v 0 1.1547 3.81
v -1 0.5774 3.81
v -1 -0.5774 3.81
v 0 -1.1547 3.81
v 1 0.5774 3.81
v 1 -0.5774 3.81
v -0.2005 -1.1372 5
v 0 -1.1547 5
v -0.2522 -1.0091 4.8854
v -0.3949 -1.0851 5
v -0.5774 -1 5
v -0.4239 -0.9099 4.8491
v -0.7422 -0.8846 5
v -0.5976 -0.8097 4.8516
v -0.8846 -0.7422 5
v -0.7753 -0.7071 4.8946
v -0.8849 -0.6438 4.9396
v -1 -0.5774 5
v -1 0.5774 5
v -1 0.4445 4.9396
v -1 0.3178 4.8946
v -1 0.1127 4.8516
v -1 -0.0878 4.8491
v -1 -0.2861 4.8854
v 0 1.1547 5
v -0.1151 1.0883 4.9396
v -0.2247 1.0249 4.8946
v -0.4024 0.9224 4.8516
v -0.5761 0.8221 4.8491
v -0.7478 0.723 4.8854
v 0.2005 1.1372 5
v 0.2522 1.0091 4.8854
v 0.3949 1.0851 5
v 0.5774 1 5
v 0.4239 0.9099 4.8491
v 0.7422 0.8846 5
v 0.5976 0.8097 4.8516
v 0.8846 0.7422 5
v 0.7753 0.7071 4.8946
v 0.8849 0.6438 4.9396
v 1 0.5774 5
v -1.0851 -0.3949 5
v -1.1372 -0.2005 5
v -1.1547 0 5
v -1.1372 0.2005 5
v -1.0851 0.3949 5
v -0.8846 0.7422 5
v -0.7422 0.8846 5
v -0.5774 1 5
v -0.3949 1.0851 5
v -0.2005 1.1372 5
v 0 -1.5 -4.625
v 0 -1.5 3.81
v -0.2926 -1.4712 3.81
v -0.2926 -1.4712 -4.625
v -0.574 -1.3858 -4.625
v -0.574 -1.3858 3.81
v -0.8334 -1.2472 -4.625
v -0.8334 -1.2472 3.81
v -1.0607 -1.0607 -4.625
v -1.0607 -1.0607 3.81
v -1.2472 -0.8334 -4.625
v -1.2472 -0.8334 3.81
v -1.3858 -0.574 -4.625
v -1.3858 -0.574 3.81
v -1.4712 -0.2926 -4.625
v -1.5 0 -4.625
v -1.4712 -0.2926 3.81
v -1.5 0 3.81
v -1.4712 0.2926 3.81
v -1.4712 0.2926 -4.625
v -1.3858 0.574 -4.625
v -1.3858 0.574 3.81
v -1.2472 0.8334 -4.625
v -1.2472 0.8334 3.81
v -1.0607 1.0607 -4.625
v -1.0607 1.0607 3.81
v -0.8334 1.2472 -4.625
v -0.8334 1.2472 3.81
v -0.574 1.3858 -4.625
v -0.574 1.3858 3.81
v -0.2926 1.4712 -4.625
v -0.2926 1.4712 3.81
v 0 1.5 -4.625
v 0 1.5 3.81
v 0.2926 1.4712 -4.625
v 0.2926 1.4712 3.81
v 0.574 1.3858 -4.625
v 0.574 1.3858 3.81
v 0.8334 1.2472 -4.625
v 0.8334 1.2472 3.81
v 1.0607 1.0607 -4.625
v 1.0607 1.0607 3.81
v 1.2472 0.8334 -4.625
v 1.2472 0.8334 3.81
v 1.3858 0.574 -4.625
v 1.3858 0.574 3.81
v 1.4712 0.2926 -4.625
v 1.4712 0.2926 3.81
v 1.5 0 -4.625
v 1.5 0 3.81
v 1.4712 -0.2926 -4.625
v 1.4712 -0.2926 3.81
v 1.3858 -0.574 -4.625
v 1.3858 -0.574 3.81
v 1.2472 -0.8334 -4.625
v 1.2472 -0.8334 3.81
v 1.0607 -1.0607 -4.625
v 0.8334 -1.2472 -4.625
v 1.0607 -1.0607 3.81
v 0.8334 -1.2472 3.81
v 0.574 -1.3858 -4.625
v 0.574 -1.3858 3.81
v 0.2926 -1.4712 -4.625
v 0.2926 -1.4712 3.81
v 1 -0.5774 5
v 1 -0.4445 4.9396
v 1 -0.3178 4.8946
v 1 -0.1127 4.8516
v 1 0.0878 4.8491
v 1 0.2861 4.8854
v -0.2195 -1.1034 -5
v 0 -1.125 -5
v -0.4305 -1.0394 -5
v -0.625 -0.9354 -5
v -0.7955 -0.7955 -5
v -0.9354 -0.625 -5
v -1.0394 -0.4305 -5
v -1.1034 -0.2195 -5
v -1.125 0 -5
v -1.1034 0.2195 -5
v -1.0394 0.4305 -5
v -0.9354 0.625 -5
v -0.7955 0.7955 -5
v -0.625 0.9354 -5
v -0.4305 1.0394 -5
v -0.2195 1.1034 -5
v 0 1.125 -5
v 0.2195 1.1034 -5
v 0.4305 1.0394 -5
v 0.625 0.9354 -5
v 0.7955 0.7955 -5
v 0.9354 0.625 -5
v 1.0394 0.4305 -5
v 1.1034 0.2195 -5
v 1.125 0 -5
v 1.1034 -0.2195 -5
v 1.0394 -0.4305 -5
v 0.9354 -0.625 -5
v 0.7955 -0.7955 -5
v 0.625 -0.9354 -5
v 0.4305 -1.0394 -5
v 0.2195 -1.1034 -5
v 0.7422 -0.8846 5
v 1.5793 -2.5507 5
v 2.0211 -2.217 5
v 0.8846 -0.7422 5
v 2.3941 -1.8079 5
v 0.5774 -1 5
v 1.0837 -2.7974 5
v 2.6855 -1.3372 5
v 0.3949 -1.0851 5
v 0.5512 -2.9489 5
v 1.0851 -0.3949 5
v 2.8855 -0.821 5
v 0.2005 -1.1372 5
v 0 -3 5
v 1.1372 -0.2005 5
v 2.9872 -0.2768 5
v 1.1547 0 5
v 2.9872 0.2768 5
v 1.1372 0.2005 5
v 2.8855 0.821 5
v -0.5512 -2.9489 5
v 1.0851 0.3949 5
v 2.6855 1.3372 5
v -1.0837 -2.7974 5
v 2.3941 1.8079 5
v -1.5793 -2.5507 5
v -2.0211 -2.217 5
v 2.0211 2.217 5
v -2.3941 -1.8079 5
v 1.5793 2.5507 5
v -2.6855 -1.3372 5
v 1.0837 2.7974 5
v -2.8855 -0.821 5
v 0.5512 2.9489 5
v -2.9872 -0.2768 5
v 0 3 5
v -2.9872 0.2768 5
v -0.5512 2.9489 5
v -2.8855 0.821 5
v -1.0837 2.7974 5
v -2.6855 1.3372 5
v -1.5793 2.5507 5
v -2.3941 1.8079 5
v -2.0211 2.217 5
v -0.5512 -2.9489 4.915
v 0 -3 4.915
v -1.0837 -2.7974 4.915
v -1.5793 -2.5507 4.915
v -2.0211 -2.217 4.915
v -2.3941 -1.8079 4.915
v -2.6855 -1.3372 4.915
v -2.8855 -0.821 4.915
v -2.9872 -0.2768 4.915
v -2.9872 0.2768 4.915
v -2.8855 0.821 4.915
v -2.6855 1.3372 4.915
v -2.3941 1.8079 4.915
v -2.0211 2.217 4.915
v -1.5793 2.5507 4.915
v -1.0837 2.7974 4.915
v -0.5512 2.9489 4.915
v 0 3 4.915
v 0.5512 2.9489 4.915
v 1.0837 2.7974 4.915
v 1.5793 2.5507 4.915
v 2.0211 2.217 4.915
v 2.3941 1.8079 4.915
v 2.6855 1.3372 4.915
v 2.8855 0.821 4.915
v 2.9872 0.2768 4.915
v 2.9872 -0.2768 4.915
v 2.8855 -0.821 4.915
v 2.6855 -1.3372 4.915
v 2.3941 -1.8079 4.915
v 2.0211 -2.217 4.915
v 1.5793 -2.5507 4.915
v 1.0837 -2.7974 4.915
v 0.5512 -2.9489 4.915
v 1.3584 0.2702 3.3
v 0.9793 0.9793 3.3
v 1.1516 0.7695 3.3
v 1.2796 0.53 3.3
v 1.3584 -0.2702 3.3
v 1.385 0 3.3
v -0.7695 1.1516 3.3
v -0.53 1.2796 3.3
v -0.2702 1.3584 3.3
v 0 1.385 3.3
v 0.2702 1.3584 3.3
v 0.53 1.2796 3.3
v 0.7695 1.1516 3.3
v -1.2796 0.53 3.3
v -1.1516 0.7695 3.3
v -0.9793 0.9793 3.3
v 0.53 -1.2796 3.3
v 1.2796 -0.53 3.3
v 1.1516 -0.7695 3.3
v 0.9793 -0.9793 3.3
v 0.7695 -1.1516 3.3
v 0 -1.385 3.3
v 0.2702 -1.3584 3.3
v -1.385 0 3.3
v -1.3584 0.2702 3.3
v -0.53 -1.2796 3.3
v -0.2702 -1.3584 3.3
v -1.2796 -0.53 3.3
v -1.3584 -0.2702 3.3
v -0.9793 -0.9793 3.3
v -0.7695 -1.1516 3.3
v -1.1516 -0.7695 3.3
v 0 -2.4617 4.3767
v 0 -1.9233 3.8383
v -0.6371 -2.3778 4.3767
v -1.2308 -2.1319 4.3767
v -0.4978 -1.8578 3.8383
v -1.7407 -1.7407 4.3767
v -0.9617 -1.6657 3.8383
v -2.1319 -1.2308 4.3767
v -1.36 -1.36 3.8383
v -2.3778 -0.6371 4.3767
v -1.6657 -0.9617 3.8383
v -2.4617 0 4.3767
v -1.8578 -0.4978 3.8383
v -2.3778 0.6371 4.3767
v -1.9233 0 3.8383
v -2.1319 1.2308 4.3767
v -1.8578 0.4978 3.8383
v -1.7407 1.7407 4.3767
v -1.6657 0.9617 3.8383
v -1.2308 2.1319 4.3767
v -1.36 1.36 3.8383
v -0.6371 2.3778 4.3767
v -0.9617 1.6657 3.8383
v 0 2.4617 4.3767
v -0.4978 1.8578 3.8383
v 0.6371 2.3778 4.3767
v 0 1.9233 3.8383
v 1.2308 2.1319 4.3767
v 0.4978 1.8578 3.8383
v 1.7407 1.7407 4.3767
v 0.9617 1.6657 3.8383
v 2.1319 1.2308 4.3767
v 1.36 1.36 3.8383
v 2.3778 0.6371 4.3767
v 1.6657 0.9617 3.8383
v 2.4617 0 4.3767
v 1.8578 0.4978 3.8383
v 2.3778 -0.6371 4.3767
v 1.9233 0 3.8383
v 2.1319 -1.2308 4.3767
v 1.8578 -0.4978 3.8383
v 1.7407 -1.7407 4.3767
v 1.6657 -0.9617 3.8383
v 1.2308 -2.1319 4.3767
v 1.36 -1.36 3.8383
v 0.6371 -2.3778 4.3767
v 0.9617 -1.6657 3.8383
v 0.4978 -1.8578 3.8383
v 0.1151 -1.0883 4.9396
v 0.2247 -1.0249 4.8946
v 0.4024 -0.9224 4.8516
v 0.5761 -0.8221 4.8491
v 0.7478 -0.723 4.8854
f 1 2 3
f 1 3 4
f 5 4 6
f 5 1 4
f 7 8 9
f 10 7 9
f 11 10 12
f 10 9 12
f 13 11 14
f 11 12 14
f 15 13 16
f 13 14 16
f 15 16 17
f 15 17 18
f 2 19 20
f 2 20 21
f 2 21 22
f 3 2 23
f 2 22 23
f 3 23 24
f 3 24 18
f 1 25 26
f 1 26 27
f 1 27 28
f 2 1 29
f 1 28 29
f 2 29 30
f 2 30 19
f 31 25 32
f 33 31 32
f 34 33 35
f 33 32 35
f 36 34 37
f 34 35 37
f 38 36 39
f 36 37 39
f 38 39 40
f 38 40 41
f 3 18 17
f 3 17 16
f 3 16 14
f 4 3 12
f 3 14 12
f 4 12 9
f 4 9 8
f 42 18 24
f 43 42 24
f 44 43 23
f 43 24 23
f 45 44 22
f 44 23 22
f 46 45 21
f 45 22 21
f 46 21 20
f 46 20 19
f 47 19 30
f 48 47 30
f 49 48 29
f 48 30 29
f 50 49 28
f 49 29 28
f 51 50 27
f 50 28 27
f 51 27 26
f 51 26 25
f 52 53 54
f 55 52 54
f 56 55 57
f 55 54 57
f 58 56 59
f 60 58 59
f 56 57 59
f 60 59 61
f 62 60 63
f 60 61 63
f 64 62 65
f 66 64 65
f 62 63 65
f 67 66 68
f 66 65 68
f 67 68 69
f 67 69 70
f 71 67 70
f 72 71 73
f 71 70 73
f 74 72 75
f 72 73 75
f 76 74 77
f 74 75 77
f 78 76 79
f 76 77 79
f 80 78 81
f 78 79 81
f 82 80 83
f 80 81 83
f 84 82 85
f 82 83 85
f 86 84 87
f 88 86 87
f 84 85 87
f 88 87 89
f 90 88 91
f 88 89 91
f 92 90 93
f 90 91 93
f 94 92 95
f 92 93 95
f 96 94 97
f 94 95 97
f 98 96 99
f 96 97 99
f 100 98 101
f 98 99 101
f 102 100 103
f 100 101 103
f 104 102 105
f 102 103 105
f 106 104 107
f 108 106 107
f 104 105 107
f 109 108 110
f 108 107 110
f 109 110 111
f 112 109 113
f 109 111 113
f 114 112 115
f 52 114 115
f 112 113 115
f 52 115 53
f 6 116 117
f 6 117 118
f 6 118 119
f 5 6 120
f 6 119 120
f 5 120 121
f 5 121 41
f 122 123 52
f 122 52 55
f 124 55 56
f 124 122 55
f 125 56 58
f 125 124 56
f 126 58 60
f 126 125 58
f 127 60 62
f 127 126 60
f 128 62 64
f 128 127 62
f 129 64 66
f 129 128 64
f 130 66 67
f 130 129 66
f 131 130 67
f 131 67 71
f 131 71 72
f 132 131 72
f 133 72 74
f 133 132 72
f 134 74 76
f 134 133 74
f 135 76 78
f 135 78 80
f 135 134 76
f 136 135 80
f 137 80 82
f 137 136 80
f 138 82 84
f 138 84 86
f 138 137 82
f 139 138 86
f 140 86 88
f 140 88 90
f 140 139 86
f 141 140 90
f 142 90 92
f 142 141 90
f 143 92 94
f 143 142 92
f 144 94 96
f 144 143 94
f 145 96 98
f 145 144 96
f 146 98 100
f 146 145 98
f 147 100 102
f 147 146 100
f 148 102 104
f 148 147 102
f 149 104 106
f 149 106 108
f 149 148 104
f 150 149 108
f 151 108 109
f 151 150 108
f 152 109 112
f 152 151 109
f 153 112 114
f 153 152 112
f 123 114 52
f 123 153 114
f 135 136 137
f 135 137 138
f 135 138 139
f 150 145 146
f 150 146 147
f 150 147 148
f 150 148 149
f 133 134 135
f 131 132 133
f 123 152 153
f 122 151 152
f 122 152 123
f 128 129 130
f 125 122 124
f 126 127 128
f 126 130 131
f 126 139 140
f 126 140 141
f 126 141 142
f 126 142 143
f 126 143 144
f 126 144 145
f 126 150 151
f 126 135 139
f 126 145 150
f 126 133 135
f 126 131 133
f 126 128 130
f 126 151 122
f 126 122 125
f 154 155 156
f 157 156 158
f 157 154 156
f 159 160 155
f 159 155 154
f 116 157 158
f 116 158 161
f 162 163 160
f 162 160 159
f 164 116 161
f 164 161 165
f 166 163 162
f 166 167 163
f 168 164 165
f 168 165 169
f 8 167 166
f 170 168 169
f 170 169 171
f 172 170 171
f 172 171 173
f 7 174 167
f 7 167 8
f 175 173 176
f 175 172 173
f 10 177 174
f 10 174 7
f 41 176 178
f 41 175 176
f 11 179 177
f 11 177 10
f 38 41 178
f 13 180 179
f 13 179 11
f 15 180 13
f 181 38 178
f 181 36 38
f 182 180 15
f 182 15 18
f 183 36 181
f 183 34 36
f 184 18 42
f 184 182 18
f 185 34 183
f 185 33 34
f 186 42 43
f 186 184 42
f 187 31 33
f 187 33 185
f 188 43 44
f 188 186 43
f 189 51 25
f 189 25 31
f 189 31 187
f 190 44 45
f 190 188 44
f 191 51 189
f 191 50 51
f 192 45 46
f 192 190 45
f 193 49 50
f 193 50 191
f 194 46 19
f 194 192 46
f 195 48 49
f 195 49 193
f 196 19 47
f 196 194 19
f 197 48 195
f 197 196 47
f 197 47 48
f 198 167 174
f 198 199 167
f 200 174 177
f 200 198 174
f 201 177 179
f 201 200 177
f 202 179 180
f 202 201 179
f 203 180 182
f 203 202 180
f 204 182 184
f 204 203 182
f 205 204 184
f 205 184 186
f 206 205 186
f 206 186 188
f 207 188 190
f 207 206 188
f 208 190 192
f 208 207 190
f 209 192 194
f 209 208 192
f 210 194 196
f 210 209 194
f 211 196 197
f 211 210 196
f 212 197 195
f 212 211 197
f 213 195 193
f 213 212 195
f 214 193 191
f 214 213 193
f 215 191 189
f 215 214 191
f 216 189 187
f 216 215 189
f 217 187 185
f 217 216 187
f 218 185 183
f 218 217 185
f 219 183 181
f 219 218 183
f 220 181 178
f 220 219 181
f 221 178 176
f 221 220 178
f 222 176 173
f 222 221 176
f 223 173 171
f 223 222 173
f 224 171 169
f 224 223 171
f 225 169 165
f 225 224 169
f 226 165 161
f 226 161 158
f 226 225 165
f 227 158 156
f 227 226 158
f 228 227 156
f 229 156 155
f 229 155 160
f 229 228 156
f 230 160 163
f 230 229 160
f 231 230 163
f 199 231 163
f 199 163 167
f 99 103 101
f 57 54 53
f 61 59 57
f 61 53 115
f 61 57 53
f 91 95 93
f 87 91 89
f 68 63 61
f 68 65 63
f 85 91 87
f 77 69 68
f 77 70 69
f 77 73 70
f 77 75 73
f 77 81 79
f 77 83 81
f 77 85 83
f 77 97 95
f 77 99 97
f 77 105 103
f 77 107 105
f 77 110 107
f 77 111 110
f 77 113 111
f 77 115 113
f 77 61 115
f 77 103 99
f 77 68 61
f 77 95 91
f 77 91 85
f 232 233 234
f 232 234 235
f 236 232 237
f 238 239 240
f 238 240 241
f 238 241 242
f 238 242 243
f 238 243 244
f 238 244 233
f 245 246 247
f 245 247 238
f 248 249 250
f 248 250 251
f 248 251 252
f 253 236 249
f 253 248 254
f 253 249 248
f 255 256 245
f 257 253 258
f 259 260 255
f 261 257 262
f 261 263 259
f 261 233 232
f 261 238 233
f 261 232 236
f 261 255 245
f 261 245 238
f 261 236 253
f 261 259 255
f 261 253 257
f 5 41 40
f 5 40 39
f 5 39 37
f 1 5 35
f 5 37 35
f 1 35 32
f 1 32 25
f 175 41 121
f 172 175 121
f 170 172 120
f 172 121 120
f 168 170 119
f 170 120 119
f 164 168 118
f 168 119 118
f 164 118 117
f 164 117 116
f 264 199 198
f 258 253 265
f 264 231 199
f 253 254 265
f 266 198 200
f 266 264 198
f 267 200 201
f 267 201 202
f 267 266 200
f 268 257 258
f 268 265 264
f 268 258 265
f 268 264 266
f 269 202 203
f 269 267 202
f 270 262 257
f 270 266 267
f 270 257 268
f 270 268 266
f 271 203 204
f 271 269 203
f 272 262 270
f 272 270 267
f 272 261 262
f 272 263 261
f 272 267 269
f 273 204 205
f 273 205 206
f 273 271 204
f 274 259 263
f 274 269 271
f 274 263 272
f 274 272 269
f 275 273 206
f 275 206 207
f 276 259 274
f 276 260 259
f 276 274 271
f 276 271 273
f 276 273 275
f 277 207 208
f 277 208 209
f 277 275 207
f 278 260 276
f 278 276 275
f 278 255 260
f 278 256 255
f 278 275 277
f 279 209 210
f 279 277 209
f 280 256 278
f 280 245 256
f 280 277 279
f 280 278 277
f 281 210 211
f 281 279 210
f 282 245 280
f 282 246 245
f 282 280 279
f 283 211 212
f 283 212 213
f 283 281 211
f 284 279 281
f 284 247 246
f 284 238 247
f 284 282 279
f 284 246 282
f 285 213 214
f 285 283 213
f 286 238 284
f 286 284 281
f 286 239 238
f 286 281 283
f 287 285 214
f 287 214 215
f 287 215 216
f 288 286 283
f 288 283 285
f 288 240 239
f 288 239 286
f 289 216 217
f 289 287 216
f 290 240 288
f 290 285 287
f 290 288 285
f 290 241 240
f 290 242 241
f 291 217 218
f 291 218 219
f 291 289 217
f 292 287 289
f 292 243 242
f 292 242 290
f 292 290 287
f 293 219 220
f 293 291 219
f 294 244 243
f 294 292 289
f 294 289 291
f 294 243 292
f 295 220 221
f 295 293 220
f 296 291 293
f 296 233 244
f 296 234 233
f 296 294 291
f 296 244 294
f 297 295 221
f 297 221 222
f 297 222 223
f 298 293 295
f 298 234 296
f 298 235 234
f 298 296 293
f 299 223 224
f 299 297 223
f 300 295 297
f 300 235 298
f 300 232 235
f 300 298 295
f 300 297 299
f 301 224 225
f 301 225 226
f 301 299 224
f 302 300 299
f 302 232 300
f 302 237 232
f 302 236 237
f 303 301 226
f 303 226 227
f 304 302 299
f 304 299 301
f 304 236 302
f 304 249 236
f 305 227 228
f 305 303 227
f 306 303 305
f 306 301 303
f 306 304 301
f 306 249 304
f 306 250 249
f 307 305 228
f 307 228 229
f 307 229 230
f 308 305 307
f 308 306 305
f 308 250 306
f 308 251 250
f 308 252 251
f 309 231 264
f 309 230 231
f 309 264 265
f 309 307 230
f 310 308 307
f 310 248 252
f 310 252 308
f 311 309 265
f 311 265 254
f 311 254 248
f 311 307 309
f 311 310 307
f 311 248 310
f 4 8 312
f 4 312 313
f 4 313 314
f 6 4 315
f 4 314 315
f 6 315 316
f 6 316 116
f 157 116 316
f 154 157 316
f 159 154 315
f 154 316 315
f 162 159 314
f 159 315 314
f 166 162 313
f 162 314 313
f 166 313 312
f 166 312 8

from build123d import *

# Parameters (mm, degrees)
CHAMFER1_SIZE      = 0.375
CUT_EXTRUDE2_DEPTH = 1.19


with BuildPart() as part:
    # Sketch1 → Revolve1 (revolve)
    with BuildSketch(Plane(origin=(0, 0, 0), x_dir=(0, 0, -1), z_dir=(1, 0, 0))):
        Polygon((-3.3, 1.5), (5, 1.5), (5, 0), (-3.81, 0), (-3.81, 1.5), align=None)
    revolve(axis=Axis((0, 0, 3.81), (0, 0, -1)))

    # Chamfer1
    chamfer1_edges = [part.edges().sort_by_distance(p)[0] for p in [
        (0, -1.5, -5),
    ]]
    chamfer(chamfer1_edges, length=CHAMFER1_SIZE)


with BuildPart() as body_2:
    # Sketch7 → Revolve2 (revolve)
    with BuildSketch(Plane(origin=(0, 0, 0), x_dir=(0, 0, -1), z_dir=(1, 0, 0))):
        Polygon((-4.915, 3), (-5, 3), (-5, 0), (-3.3, 0), (-3.3, 1.385), align=None)
    revolve(axis=Axis((0, 0, 5), (0, 0, -1)))

    # Sketch5 → Cut-Extrude2 (cut)
    with BuildSketch(Plane.XY.offset(5)):
        Polygon((1, -0.577350269), (1, 0.577350269), (0, 1.154700538), (-1, 0.577350269), (-1, -0.577350269), (0, -1.154700538), align=None)
    extrude(amount=-CUT_EXTRUDE2_DEPTH, mode=Mode.SUBTRACT)

    # Cut-Extrude3 cone 1 section (through the dimple's axis) → Cut-Extrude3 (revolve, cut)
    with BuildSketch(Plane(origin=(0, 0, 5), x_dir=(0, -1, 0), z_dir=(1, 0, 0))):
        Polygon((0, 0), (1.154700538, 0), (0, 1.154700538), align=None)
    revolve(axis=Axis((0, 0, 5), (0, 0, -1)), mode=Mode.SUBTRACT)


solid = Compound([part.part, body_2.part])
